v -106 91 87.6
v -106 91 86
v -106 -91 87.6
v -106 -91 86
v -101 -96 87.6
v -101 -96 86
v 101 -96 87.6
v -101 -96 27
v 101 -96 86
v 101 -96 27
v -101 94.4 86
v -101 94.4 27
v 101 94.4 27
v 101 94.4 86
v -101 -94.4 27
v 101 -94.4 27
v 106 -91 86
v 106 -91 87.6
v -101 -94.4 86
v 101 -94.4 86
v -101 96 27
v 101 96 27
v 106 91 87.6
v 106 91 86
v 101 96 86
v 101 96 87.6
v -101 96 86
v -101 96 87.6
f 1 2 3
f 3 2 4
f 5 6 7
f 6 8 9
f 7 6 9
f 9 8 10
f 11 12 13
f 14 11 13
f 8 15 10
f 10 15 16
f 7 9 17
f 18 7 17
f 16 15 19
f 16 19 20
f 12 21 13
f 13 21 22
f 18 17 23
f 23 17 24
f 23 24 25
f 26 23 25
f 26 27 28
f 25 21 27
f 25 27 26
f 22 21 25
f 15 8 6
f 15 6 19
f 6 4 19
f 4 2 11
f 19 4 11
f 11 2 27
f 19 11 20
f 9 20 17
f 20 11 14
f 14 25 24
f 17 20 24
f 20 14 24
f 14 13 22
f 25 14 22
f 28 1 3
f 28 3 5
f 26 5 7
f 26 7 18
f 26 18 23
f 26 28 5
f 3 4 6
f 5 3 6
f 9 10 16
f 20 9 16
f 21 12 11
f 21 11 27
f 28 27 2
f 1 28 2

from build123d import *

# Parameters (mm, degrees)
F_5052_START                            = 86
F_5052_SHEET_TOP_PANEL_DEPTH            = 1.6
FOLDED_START                            = 27
SKETCH2_W                               = 202
SKETCH2_H                               = 1.6
FOLDED_SIDE_SKIRTS_WITH_OPEN_ENDS_DEPTH = 59


with BuildPart() as part:
    # Sketch1 → 5052 sheet top panel (new body)
    with BuildSketch(Plane.XY.offset(F_5052_START)):
        Polygon((-101, -96), (101, -96), (106, -91), (106, 91), (101, 96), (-101, 96), (-106, 91), (-106, -91), align=None)
    extrude(amount=F_5052_SHEET_TOP_PANEL_DEPTH)

    # Sketch2 → Folded side skirts with open ends (add)
    with BuildSketch(Plane.XY.offset(FOLDED_START)):
        with Locations((0, 95.2)):
            Rectangle(SKETCH2_W, SKETCH2_H)
        with Locations((0, -95.2)):
            Rectangle(SKETCH2_W, SKETCH2_H)
    extrude(amount=FOLDED_SIDE_SKIRTS_WITH_OPEN_ENDS_DEPTH)


solid = part.part
